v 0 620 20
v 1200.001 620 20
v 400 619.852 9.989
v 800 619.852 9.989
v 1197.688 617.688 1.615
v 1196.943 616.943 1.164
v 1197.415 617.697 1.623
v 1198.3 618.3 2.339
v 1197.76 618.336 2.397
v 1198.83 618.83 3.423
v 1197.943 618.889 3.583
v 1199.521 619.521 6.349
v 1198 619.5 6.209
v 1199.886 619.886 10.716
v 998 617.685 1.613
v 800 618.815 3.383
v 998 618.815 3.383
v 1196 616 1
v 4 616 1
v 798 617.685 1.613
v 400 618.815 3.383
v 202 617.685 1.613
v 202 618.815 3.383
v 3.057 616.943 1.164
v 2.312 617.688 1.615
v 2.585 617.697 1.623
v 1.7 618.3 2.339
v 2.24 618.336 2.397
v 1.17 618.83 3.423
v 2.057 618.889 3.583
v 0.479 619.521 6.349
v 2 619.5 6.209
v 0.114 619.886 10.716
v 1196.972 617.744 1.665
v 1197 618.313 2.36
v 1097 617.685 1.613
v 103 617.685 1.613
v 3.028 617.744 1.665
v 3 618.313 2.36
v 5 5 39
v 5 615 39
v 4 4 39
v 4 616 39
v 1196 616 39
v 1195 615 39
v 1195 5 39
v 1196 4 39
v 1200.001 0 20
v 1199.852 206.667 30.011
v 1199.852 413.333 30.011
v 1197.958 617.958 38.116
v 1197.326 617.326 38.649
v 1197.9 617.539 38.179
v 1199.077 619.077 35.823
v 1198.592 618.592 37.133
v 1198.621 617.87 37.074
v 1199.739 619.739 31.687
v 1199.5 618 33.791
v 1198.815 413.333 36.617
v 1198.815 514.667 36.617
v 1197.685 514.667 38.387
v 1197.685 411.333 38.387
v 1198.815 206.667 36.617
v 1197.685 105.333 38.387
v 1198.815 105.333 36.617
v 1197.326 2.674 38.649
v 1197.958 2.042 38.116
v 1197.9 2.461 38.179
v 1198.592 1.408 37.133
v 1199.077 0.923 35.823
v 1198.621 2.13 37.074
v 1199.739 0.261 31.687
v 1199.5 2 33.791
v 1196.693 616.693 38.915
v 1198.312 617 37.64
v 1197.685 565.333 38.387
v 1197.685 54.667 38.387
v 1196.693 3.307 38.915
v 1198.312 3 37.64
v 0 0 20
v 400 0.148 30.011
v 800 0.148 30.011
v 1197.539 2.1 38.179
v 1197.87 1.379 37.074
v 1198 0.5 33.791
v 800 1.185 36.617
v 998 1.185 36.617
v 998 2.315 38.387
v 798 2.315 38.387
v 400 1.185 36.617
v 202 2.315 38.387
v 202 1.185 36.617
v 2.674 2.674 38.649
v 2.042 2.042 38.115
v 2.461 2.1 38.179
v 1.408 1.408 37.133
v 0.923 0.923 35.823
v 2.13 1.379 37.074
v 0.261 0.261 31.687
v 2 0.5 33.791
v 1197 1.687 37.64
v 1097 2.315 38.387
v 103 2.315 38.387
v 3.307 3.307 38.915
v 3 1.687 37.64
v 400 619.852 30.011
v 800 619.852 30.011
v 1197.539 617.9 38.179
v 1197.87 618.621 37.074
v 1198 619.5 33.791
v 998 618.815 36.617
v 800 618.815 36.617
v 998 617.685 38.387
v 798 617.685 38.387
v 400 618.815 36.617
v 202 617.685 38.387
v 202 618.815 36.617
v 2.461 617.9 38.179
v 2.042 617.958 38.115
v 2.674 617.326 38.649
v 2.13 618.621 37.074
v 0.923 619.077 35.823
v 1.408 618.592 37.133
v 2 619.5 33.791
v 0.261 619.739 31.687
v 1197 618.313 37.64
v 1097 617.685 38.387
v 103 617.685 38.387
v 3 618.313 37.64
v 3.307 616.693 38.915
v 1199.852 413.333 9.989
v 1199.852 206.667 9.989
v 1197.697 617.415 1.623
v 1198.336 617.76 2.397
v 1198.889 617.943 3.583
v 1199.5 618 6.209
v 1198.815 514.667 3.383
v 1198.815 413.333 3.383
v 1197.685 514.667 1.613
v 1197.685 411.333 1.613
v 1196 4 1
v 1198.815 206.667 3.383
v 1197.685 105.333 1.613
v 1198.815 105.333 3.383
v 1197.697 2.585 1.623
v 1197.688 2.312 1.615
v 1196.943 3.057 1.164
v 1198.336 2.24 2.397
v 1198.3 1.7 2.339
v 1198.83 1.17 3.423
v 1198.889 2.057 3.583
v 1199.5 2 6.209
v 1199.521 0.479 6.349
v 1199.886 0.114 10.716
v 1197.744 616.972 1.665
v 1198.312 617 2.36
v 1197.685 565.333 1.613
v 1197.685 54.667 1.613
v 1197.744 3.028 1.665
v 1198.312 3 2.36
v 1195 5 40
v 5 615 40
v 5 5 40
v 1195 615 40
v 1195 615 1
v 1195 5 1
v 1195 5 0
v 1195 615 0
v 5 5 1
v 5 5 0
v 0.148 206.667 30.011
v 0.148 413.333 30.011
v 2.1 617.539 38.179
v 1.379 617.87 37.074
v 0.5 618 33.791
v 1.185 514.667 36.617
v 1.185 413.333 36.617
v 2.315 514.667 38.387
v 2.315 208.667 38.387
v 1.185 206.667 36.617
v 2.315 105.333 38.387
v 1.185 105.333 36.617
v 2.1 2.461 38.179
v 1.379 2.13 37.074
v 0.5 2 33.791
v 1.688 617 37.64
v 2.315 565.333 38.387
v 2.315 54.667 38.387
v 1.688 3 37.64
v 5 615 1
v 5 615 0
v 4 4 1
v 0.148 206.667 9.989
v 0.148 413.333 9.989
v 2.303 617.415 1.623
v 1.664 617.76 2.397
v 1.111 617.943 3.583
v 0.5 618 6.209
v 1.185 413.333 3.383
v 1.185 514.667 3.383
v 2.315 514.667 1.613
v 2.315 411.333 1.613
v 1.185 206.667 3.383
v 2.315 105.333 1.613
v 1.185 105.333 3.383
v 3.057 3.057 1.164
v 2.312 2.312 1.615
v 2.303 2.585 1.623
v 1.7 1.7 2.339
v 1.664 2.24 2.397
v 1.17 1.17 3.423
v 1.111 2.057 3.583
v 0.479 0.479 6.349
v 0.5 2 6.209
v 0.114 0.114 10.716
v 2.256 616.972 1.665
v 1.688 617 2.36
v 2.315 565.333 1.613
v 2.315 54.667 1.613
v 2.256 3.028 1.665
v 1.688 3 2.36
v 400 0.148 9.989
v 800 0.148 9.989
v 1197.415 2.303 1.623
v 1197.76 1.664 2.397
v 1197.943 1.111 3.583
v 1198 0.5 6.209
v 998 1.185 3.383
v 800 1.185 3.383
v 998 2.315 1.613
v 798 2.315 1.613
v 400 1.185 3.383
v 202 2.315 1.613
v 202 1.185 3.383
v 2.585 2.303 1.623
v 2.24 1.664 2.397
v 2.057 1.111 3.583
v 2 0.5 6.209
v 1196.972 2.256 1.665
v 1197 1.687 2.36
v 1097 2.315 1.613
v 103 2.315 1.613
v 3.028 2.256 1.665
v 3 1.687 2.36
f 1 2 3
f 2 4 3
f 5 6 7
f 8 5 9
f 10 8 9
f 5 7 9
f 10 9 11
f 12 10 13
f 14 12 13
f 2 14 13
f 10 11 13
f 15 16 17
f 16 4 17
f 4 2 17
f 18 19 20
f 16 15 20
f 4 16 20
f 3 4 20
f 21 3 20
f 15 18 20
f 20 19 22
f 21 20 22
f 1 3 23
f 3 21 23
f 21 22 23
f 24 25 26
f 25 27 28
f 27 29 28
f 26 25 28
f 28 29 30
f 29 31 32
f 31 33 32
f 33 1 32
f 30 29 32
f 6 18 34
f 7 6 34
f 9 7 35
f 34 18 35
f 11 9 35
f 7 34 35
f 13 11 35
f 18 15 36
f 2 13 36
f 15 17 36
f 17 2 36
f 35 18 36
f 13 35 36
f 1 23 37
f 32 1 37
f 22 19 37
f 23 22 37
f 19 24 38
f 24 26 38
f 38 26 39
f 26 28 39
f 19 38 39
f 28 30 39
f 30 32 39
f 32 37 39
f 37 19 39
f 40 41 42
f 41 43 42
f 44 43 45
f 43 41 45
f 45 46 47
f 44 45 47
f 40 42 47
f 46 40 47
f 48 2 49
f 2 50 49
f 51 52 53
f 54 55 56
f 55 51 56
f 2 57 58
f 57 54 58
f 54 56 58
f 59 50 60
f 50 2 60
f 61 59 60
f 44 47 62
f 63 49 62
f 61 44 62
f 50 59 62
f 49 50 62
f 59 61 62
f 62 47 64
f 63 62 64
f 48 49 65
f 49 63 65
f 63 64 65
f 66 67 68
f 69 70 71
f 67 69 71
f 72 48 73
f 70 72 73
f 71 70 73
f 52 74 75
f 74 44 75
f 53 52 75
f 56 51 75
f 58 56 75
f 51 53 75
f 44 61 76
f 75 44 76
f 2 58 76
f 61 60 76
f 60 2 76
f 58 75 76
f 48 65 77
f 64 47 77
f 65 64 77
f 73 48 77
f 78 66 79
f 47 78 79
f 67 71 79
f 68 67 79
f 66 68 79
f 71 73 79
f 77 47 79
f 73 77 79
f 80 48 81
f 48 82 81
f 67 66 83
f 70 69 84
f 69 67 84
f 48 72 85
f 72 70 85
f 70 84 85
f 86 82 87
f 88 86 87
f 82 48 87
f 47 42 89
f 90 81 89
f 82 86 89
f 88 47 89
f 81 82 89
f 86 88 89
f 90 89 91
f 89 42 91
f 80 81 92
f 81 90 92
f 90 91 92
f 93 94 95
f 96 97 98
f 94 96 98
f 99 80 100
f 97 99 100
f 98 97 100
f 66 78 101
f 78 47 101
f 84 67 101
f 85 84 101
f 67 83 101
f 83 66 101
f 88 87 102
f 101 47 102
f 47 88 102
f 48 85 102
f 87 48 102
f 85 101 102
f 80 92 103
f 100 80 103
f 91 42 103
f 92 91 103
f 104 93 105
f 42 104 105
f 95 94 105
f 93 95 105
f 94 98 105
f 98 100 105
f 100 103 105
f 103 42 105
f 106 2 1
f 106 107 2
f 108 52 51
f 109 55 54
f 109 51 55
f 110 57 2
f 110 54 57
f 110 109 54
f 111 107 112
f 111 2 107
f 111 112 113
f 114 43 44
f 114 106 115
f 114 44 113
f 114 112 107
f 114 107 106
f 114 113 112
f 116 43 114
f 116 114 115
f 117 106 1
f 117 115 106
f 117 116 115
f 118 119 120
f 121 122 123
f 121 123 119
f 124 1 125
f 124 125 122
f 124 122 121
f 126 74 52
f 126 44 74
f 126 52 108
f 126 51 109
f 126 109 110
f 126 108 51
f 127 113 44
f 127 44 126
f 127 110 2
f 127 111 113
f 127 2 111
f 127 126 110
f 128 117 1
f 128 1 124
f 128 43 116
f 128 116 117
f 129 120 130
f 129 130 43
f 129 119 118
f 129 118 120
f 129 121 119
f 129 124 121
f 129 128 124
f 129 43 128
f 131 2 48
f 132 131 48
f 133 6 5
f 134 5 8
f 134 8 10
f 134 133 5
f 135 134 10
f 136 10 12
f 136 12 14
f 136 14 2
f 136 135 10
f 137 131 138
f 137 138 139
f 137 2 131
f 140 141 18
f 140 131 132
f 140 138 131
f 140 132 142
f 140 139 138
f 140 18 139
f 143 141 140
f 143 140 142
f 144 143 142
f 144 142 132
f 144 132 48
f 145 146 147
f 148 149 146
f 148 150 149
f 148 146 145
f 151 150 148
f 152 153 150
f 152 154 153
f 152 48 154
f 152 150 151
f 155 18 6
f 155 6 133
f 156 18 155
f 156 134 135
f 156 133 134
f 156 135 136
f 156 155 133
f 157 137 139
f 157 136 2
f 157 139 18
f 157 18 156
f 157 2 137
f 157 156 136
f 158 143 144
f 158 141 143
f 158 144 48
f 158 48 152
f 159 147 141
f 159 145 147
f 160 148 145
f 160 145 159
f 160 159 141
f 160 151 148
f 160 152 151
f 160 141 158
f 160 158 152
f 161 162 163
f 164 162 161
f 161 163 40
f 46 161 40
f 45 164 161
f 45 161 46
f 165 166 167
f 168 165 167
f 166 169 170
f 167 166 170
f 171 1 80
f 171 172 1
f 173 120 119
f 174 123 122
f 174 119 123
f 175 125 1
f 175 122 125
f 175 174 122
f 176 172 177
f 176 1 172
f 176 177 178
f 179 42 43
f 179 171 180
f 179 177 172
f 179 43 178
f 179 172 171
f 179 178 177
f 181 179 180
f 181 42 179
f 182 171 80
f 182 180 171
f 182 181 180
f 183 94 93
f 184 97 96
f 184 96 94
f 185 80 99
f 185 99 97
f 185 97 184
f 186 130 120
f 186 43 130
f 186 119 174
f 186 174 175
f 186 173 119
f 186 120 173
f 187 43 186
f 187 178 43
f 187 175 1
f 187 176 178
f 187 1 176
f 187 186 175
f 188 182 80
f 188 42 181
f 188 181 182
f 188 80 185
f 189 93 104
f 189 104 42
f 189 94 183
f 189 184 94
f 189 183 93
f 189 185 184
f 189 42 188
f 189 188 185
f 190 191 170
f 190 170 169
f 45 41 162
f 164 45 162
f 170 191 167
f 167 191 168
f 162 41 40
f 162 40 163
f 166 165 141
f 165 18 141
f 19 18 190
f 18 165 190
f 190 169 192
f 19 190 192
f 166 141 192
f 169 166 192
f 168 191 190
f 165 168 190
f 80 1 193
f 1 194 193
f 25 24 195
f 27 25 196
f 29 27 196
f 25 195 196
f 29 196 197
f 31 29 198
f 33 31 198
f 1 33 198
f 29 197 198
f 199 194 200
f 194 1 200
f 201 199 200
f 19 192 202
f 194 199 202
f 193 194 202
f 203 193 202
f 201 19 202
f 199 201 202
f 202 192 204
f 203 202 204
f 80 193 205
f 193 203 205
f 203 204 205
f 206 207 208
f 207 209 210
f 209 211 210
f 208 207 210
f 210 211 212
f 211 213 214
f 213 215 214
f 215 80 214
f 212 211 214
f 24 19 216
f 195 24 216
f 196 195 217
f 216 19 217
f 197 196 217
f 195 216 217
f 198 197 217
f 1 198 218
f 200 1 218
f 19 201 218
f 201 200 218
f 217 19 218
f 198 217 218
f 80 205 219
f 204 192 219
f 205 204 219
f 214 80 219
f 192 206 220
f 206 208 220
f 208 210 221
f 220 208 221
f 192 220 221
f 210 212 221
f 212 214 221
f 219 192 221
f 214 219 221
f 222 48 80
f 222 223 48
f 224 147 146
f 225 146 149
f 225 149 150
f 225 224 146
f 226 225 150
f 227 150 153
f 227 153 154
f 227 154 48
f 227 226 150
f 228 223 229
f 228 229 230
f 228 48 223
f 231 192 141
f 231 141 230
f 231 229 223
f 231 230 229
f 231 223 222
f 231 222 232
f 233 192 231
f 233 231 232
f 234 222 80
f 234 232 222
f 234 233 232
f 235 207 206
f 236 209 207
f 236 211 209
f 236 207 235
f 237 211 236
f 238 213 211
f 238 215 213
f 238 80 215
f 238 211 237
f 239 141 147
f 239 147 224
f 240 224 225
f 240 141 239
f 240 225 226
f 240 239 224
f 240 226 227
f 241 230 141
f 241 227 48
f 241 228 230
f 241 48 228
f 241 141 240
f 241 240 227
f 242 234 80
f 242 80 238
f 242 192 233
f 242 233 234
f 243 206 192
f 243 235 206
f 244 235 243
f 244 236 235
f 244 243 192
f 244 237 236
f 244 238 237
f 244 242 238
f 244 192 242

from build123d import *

# Parameters (mm, degrees)
F0_W     = 1200
F0_H     = 620
F1_DEPTH = 40
F3_DEPTH = 620.001
F6_DEPTH = 1200.0010001015


# Not quite as in the source:
# - ends of sketch curves that miss each other by under 0.0002 mm in the source are joined


with BuildPart() as f1:
    # F0 (on Top) → F1 (new body)
    with BuildSketch(Plane.XY):
        with Locations((600, 310)):
            Rectangle(F0_W, F0_H)
    extrude(amount=F1_DEPTH)

    # F2 (on face) → F3 (cut, through all)
    with BuildSketch(Plane.XZ):
        with BuildLine():
            add(Edge.make_bspline(
                [(4, 1), (0, 1), (0, 8.5583151877), (0, 20)],
                knots=[0, 0, 0, 0, 19.4164878389, 19.4164878389, 19.4164878389, 19.4164878389], degree=3))
            Line((0, 20), (0, 0))
            Line((0, 0), (5, 0))
            Line((5, 0), (5, 1))
            Line((5, 1), (4, 1))
        make_face()
        with BuildLine():
            add(Edge.make_bspline(
                [(4, 39), (0, 39), (0, 31.4416848123), (0, 20)],
                knots=[0, 0, 0, 0, 19.4164878389, 19.4164878389, 19.4164878389, 19.4164878389], degree=3))
            Line((4, 39), (5, 39))
            Line((5, 39), (5, 40))
            Line((5, 40), (0, 40))
            Line((0, 40), (0, 20))
        make_face()
        with BuildLine():
            add(Edge.make_bspline(
                [(1196, 39), (1200, 39), (1200, 31.4416848123), (1200, 20)],
                knots=[0, 0, 0, 0, 19.4164878389, 19.4164878389, 19.4164878389, 19.4164878389], degree=3))
            Line((1200, 20), (1200, 40))
            Line((1200, 40), (1195, 40))
            Line((1195, 40), (1195, 39))
            Line((1195, 39), (1196, 39))
        make_face()
        with BuildLine():
            Line((1195, 1), (1195, 0))
            Line((1195, 0), (1200, 0))
            Line((1200, 0), (1200, 20))
            add(Edge.make_bspline(
                [(1196, 1), (1200, 1), (1200, 8.5583151877), (1200, 20)],
                knots=[0, 0, 0, 0, 19.4164878389, 19.4164878389, 19.4164878389, 19.4164878389], degree=3))
            Line((1196, 1), (1195, 1))
        make_face()
    extrude(amount=-F3_DEPTH, mode=Mode.SUBTRACT)

    # F5 (on offset) → F6 (cut, through all)
    with BuildSketch(Plane(origin=(0, 0, 0), x_dir=(0, -1, 0), z_dir=(-1, 0, 0))):
        with BuildLine():
            add(Edge.make_bspline(
                [(-616.000000023, 1), (-620, 1), (-620, 8.5583149148), (-620, 19.9999997259)],
                knots=[0, 0, 0, 0, 19.416487566, 19.416487566, 19.416487566, 19.416487566], degree=3))
            Line((-620, 19.9999997259), (-620, 0))
            Line((-620, 0), (-615, 0))
            Line((-615, 0), (-615, 1))
            Line((-615, 1), (-616.000000023, 1))
        make_face()
        with BuildLine():
            add(Edge.make_bspline(
                [(-616.000000023, 39), (-620, 39), (-620, 31.4416850852), (-620, 20.0000002741)],
                knots=[0, 0, 0, 0, 19.416487566, 19.416487566, 19.416487566, 19.416487566], degree=3))
            Line((-616.000000023, 39), (-615, 39))
            Line((-615, 39), (-615, 40))
            Line((-615, 40), (-620, 40))
            Line((-620, 40), (-620, 20.0000002741))
        make_face()
        with BuildLine():
            add(Edge.make_bspline(
                [(-3.999999977, 39), (0, 39), (0, 31.4416850853), (0, 20.0000002741)],
                knots=[0, 0, 0, 0, 19.416487566, 19.416487566, 19.416487566, 19.416487566], degree=3))
            Line((0, 20.0000002741), (0, 40))
            Line((0, 40), (-5, 40))
            Line((-5, 40), (-5, 39))
            Line((-5, 39), (-3.999999977, 39))
        make_face()
        with BuildLine():
            Line((-5, 1), (-5, 0))
            Line((-5, 0), (0, 0))
            Line((0, 0), (0, 20))
            add(Edge.make_bspline(
                [(-3.999999977, 1), (0, 1), (0, 8.5583149148), (0, 20)],
                knots=[0, 0, 0, 0, 19.416487566, 19.416487566, 19.416487566, 19.416487566], degree=3))
            Line((-3.999999977, 1), (-5, 1))
        make_face()
    extrude(amount=-F6_DEPTH, mode=Mode.SUBTRACT)


solid = f1.part
